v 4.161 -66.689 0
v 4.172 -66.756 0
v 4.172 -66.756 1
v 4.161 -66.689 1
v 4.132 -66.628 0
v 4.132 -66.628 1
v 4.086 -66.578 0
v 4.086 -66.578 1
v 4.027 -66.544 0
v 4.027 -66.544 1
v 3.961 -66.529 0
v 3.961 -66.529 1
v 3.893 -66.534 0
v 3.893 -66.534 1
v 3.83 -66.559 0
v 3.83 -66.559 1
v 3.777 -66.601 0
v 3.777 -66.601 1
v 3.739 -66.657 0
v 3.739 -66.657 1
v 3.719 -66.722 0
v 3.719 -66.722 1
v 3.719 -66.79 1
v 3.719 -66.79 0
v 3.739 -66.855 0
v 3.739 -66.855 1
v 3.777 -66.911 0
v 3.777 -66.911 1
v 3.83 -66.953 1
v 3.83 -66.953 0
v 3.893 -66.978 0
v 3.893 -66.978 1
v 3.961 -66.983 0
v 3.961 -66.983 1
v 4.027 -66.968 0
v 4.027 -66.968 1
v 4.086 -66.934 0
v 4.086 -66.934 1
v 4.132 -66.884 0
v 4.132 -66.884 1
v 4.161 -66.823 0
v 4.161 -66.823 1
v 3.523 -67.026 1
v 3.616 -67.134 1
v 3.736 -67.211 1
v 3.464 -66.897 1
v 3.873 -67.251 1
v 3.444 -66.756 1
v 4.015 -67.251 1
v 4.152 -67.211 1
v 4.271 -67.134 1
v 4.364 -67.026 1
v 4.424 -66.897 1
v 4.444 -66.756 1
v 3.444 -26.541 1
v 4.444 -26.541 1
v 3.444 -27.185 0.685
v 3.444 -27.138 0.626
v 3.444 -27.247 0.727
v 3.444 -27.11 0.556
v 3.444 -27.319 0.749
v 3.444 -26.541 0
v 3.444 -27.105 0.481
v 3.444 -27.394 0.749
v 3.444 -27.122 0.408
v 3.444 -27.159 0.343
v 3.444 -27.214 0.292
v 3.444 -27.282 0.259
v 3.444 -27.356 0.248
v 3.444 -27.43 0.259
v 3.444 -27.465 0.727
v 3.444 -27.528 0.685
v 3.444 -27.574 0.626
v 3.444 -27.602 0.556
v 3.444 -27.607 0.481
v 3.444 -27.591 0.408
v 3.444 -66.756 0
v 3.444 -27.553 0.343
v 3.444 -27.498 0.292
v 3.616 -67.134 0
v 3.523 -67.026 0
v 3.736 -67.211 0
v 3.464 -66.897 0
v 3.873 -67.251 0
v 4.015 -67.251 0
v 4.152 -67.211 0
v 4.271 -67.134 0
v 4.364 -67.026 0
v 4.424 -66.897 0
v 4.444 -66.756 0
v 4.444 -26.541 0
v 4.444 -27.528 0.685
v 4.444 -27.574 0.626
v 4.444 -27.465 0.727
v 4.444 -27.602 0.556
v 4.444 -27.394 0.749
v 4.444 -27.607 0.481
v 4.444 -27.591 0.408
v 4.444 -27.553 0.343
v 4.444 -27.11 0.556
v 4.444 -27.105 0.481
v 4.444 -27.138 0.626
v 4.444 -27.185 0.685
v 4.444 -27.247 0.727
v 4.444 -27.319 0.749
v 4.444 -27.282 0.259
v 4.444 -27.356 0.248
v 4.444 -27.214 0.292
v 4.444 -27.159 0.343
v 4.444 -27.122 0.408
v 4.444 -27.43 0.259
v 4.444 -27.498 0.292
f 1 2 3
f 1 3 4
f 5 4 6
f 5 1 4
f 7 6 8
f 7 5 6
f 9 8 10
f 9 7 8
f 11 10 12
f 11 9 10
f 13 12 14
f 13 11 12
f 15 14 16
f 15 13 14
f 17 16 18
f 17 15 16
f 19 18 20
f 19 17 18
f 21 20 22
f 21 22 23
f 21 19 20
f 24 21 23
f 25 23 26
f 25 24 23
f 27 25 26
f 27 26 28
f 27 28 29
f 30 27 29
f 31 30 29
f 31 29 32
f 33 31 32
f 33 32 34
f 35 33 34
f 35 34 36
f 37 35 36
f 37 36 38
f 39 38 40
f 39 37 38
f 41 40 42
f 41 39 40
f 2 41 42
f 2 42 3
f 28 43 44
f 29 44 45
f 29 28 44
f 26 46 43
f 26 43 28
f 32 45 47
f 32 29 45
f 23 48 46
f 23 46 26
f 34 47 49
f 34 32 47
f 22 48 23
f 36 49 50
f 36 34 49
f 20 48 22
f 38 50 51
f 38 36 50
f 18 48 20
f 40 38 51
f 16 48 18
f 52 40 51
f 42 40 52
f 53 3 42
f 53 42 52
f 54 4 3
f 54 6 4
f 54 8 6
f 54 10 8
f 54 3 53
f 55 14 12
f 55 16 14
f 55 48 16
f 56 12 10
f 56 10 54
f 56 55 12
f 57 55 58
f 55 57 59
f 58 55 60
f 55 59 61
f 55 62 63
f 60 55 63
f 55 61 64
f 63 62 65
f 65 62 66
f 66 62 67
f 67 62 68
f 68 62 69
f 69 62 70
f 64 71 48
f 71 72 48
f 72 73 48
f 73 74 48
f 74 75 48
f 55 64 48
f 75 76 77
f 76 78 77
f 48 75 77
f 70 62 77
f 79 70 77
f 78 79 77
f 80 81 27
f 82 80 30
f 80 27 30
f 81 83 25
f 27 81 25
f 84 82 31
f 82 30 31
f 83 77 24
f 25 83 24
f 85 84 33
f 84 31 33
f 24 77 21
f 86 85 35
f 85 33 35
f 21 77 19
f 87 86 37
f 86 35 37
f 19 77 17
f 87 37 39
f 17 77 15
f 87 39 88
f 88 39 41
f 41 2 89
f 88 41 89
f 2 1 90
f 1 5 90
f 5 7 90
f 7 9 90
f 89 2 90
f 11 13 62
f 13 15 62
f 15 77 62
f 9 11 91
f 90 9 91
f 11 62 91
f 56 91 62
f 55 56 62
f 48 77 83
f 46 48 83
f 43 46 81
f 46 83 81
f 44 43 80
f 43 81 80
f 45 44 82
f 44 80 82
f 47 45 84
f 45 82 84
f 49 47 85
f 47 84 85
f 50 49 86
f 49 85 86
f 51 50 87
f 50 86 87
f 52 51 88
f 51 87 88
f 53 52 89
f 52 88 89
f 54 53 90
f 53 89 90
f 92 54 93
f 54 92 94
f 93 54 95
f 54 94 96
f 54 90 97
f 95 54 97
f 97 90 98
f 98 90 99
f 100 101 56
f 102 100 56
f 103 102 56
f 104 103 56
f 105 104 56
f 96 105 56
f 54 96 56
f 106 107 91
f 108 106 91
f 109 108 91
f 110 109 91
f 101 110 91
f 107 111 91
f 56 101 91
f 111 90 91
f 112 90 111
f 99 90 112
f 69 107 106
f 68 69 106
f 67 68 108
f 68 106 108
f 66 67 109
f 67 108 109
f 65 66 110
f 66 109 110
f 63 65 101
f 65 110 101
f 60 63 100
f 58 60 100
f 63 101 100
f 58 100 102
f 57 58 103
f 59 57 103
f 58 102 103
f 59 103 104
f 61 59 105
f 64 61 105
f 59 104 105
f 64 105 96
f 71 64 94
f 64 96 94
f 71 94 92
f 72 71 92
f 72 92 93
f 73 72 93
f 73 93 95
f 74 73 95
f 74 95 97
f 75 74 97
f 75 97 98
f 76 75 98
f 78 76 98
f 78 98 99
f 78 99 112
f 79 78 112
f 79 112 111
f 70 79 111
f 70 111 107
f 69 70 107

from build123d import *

# Parameters (mm, degrees)
SKETCH1_R           = 0.227761077
BOSS_EXTRUDE1_DEPTH = 1
SKETCH4_R           = 0.251968504
CUT_EXTRUDE1_DEPTH  = 10


with BuildPart() as part:
    # Sketch1 → Boss-Extrude1 (new body)
    with BuildSketch(Plane.XY):
        with BuildLine():
            Line((3.44382586, -27.356132879), (3.44382586, -66.756132879))
            ThreePointArc((3.44382586, -66.756132879), (3.94382586, -67.256132879), (4.44382586, -66.756132879))
            Line((4.44382586, -66.756132879), (4.44382586, -27.356132879))
            Line((4.44382586, -27.356132879), (4.44382586, -26.541134356))
            Line((4.44382586, -26.541134356), (3.44382586, -26.541134356))
            Line((3.44382586, -26.541134356), (3.44382586, -27.356132879))
        make_face()
        with Locations((3.94382586, -66.756132879)):
            Circle(SKETCH1_R, mode=Mode.SUBTRACT)
    extrude(amount=BOSS_EXTRUDE1_DEPTH)

    # Sketch4 → Cut-Extrude1 (cut)
    with BuildSketch(Plane(origin=(4.44382586, 0, 0), x_dir=(0, 0, -1), z_dir=(1, 0, 0))):
        with Locations((-0.5, -27.356132879)):
            Circle(SKETCH4_R)
    extrude(amount=-CUT_EXTRUDE1_DEPTH, mode=Mode.SUBTRACT)


solid = part.part
